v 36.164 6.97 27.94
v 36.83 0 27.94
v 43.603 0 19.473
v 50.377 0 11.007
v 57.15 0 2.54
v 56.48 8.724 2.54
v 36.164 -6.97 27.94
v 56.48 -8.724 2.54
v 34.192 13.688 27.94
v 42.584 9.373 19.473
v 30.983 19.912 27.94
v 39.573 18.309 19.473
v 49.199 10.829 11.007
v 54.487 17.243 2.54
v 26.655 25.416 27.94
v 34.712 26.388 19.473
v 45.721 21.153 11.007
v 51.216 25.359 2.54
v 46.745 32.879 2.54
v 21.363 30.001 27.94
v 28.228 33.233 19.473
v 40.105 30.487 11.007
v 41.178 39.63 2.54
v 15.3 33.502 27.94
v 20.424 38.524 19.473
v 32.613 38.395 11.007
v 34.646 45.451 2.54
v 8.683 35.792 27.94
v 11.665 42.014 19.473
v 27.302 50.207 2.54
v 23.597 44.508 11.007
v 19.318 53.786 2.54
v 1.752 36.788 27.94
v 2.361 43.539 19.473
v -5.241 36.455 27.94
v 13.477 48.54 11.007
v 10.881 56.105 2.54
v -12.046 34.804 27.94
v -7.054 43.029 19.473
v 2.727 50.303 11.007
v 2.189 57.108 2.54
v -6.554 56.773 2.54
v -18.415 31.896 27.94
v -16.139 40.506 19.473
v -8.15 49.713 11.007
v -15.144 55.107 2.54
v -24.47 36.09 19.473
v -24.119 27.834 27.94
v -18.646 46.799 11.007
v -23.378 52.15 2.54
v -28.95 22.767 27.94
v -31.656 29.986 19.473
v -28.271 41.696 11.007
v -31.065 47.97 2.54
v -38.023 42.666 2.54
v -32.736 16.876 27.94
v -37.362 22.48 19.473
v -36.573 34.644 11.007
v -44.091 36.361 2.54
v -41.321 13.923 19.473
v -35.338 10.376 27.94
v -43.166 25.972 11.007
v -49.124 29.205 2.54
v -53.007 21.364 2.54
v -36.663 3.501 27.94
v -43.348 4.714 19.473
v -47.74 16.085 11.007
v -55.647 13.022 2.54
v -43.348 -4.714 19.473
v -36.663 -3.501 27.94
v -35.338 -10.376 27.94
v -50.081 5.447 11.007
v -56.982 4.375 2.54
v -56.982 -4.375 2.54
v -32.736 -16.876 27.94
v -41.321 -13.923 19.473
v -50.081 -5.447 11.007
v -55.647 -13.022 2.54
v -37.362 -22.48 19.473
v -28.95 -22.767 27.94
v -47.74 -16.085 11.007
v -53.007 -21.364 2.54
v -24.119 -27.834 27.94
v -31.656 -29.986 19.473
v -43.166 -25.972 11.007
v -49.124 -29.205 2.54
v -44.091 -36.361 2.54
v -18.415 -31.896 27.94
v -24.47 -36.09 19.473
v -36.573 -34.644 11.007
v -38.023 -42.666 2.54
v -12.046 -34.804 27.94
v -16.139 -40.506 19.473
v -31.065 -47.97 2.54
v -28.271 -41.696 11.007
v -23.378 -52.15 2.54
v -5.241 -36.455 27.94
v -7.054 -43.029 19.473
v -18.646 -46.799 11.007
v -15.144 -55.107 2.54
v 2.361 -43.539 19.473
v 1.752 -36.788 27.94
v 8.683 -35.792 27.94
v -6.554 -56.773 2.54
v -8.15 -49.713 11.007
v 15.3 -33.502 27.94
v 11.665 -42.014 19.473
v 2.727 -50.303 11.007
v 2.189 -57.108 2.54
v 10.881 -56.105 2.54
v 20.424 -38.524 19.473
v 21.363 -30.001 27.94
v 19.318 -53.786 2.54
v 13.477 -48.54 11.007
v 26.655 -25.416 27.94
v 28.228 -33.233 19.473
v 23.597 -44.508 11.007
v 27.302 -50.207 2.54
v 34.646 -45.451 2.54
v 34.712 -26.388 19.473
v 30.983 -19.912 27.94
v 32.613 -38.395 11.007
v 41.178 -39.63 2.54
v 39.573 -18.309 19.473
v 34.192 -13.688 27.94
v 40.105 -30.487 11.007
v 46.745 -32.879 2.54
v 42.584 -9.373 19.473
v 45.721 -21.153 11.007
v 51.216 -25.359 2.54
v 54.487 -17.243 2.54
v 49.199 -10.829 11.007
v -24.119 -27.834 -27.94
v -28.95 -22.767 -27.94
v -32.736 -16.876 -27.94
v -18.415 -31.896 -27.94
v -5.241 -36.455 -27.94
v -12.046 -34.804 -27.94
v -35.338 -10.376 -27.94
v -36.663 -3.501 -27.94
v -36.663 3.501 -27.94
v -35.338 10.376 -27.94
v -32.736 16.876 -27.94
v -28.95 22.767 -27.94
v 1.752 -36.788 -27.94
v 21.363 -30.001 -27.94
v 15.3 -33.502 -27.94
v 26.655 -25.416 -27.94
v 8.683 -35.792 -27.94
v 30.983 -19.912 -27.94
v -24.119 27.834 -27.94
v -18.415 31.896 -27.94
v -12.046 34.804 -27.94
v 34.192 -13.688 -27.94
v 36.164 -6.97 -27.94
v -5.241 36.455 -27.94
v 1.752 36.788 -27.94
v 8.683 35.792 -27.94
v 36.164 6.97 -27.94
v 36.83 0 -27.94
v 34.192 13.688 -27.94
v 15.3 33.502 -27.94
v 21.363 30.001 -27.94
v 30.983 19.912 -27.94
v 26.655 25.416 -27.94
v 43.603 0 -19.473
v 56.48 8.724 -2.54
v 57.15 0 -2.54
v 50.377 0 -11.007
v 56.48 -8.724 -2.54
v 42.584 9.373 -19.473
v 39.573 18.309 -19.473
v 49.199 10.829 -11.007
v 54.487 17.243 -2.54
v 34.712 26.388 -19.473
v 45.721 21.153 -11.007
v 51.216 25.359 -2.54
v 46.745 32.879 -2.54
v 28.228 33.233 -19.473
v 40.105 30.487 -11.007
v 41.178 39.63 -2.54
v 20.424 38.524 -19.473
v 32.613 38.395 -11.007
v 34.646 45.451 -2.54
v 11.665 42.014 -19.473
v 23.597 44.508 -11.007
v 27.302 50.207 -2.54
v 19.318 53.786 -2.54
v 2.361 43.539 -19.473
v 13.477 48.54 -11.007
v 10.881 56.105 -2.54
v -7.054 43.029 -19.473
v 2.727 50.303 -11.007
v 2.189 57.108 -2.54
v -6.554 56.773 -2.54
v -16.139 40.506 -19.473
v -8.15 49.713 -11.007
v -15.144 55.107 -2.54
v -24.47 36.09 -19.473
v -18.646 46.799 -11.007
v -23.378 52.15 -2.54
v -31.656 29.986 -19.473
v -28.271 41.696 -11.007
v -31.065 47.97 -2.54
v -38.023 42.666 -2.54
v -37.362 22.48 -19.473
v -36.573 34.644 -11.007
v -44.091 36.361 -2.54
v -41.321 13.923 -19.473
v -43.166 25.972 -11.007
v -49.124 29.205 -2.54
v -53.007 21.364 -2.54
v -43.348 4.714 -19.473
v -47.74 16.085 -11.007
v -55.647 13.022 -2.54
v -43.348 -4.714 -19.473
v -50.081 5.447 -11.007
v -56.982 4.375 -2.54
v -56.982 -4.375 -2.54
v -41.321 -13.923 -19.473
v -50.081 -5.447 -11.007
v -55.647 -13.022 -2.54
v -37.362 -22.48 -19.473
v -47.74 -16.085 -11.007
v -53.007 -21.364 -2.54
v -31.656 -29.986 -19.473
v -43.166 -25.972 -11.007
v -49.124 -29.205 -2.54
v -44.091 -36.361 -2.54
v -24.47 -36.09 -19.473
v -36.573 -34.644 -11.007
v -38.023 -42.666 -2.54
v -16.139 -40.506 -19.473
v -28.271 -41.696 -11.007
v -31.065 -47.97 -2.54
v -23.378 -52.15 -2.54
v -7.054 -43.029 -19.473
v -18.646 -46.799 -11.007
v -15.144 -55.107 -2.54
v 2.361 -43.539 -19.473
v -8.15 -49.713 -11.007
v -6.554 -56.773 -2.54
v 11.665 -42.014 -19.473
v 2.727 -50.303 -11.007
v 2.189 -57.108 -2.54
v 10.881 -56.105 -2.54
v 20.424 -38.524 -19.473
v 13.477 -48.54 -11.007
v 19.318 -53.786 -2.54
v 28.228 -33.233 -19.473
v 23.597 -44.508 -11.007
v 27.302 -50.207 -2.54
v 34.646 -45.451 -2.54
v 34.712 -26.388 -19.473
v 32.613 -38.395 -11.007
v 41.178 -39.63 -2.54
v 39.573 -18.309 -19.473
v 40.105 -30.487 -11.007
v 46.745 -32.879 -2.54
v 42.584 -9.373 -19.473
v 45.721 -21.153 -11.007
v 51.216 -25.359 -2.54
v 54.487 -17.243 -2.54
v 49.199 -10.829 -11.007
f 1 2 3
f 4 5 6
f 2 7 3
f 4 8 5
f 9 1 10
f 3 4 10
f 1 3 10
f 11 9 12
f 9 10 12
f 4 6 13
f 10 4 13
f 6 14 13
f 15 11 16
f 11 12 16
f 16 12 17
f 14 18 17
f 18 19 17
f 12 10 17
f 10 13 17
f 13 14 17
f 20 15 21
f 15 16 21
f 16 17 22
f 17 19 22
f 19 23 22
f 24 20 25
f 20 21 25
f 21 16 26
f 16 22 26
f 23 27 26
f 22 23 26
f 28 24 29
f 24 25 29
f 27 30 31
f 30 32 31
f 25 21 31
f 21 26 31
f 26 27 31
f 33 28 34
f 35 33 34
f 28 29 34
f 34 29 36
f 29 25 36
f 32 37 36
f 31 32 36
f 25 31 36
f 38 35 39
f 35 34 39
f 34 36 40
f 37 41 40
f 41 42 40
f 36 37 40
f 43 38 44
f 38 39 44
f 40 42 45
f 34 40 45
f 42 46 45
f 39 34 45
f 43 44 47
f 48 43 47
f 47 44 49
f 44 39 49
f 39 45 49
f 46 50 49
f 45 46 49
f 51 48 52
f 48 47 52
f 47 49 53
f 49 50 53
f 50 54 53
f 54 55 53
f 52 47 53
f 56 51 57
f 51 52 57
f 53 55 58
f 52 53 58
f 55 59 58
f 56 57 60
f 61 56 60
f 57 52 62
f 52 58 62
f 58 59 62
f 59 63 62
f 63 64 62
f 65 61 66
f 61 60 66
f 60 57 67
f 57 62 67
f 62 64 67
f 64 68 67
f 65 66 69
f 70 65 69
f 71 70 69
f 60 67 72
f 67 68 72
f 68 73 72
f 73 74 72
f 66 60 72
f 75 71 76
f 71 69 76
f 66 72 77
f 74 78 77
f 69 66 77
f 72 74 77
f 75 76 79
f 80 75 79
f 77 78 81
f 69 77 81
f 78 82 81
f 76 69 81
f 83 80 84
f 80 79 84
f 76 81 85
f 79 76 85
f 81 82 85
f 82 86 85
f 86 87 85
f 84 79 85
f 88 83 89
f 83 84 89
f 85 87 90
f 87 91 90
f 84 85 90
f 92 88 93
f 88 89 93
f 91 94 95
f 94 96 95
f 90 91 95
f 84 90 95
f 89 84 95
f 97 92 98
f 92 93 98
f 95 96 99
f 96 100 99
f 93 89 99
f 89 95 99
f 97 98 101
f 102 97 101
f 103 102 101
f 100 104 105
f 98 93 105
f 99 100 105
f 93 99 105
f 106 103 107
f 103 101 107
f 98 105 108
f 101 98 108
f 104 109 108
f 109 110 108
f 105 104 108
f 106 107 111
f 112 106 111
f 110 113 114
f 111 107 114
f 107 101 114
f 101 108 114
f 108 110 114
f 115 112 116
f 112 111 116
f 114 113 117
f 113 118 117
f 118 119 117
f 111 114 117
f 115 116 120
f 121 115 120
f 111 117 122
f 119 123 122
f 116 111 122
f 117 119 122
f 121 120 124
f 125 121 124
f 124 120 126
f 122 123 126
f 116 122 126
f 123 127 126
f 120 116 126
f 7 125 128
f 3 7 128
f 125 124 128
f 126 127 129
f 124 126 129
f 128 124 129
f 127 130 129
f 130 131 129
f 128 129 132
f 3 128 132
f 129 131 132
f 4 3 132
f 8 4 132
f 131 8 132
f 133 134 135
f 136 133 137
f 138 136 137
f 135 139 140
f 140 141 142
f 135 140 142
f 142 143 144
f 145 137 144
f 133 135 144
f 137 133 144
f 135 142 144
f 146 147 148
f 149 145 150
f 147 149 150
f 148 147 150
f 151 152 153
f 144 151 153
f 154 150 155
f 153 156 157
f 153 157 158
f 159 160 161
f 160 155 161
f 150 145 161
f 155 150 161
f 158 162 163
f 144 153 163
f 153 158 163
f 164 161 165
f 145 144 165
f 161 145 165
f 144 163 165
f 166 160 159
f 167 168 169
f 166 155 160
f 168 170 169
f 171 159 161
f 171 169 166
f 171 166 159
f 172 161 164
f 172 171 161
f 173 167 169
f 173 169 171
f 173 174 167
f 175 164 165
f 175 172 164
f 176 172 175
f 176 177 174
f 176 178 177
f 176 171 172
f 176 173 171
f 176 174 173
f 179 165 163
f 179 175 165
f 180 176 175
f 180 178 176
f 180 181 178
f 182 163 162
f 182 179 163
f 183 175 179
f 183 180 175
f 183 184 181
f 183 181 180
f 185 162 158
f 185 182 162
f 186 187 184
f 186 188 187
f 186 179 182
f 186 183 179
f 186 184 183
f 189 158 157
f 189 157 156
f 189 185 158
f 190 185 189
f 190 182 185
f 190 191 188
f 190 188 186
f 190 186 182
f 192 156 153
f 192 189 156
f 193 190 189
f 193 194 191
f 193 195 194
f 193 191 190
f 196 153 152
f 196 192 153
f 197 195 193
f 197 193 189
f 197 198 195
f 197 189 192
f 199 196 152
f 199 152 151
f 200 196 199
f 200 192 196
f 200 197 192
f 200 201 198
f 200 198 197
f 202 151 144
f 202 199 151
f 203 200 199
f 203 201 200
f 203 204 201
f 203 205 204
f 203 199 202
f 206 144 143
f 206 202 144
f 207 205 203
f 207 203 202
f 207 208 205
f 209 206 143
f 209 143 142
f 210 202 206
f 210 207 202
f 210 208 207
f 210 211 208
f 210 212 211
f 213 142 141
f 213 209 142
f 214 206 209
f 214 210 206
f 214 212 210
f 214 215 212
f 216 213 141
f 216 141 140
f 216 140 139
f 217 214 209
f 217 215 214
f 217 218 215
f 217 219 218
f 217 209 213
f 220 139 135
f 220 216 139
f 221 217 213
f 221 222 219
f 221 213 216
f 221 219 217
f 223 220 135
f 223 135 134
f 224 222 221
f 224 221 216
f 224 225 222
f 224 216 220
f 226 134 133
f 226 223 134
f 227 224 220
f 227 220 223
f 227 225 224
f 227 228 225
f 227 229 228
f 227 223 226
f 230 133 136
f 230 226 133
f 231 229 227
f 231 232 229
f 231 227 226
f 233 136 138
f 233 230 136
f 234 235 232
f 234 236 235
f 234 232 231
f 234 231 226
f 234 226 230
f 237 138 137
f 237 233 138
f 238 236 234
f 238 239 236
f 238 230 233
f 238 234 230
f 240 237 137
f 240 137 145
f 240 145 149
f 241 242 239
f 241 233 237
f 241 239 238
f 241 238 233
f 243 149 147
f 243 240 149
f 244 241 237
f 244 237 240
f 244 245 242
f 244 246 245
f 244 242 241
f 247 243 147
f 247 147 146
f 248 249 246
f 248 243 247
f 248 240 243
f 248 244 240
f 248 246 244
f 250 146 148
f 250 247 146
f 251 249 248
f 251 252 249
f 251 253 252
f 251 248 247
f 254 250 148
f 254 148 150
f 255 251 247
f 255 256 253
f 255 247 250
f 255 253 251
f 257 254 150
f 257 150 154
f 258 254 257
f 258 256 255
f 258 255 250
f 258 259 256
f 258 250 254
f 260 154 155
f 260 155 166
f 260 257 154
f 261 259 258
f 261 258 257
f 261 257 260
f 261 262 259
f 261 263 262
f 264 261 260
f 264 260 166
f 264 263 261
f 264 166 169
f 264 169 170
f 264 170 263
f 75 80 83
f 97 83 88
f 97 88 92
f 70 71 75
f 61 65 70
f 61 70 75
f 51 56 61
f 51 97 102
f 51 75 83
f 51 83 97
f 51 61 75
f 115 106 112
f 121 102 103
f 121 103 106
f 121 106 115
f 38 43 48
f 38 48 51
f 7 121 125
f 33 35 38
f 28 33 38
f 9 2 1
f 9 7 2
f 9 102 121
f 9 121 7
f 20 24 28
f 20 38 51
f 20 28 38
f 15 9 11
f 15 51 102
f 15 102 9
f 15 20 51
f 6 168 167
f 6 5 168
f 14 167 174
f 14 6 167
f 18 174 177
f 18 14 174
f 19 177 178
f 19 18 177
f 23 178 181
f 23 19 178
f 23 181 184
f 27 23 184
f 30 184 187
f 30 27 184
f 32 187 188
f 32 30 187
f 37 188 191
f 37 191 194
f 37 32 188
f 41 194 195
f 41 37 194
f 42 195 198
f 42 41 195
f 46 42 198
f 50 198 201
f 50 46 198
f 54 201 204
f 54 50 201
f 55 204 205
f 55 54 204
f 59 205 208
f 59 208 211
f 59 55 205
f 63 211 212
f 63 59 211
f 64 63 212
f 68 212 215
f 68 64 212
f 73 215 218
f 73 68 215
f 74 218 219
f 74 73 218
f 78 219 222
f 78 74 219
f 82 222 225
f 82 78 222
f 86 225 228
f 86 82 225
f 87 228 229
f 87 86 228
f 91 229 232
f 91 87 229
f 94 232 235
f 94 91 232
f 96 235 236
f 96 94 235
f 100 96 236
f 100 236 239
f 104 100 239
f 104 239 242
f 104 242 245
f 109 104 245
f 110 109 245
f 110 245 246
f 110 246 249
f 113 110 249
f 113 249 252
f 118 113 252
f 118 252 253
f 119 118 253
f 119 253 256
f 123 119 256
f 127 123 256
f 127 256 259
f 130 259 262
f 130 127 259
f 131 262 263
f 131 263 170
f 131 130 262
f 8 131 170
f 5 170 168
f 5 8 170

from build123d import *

# Parameters (mm, degrees)
F0_R      = 57.15
F1_DEPTH  = 2.54
F3_R      = 36.83
F1_FACE_R = 57.15


# Not quite as in the source:
# - the program builds the solid bodies; features that only make, move or delete a surface that nothing else refers to are left out


with BuildPart() as f1:
    # F0 (on Top) → F1 (new body)
    with BuildSketch(Plane.XY):
        Circle(F0_R)
    extrude(amount=F1_DEPTH)

    # F3 (on offset) → F4 section 0
    with BuildSketch(Plane.XY.offset(27.94)):
        Circle(F3_R)
    # F1_face (on face) → F4 section 1
    with BuildSketch(Plane.XY.offset(2.54)):
        Circle(F1_FACE_R)
    loft()

    # F5: F1 across face


with BuildPart() as f1_1:
    add(f1.part)
    add(f1.part.mirror(Plane(origin=(0, 0, 0), x_dir=(1, 0, 0), z_dir=(0, 0, -1))))


solid = f1_1.part
